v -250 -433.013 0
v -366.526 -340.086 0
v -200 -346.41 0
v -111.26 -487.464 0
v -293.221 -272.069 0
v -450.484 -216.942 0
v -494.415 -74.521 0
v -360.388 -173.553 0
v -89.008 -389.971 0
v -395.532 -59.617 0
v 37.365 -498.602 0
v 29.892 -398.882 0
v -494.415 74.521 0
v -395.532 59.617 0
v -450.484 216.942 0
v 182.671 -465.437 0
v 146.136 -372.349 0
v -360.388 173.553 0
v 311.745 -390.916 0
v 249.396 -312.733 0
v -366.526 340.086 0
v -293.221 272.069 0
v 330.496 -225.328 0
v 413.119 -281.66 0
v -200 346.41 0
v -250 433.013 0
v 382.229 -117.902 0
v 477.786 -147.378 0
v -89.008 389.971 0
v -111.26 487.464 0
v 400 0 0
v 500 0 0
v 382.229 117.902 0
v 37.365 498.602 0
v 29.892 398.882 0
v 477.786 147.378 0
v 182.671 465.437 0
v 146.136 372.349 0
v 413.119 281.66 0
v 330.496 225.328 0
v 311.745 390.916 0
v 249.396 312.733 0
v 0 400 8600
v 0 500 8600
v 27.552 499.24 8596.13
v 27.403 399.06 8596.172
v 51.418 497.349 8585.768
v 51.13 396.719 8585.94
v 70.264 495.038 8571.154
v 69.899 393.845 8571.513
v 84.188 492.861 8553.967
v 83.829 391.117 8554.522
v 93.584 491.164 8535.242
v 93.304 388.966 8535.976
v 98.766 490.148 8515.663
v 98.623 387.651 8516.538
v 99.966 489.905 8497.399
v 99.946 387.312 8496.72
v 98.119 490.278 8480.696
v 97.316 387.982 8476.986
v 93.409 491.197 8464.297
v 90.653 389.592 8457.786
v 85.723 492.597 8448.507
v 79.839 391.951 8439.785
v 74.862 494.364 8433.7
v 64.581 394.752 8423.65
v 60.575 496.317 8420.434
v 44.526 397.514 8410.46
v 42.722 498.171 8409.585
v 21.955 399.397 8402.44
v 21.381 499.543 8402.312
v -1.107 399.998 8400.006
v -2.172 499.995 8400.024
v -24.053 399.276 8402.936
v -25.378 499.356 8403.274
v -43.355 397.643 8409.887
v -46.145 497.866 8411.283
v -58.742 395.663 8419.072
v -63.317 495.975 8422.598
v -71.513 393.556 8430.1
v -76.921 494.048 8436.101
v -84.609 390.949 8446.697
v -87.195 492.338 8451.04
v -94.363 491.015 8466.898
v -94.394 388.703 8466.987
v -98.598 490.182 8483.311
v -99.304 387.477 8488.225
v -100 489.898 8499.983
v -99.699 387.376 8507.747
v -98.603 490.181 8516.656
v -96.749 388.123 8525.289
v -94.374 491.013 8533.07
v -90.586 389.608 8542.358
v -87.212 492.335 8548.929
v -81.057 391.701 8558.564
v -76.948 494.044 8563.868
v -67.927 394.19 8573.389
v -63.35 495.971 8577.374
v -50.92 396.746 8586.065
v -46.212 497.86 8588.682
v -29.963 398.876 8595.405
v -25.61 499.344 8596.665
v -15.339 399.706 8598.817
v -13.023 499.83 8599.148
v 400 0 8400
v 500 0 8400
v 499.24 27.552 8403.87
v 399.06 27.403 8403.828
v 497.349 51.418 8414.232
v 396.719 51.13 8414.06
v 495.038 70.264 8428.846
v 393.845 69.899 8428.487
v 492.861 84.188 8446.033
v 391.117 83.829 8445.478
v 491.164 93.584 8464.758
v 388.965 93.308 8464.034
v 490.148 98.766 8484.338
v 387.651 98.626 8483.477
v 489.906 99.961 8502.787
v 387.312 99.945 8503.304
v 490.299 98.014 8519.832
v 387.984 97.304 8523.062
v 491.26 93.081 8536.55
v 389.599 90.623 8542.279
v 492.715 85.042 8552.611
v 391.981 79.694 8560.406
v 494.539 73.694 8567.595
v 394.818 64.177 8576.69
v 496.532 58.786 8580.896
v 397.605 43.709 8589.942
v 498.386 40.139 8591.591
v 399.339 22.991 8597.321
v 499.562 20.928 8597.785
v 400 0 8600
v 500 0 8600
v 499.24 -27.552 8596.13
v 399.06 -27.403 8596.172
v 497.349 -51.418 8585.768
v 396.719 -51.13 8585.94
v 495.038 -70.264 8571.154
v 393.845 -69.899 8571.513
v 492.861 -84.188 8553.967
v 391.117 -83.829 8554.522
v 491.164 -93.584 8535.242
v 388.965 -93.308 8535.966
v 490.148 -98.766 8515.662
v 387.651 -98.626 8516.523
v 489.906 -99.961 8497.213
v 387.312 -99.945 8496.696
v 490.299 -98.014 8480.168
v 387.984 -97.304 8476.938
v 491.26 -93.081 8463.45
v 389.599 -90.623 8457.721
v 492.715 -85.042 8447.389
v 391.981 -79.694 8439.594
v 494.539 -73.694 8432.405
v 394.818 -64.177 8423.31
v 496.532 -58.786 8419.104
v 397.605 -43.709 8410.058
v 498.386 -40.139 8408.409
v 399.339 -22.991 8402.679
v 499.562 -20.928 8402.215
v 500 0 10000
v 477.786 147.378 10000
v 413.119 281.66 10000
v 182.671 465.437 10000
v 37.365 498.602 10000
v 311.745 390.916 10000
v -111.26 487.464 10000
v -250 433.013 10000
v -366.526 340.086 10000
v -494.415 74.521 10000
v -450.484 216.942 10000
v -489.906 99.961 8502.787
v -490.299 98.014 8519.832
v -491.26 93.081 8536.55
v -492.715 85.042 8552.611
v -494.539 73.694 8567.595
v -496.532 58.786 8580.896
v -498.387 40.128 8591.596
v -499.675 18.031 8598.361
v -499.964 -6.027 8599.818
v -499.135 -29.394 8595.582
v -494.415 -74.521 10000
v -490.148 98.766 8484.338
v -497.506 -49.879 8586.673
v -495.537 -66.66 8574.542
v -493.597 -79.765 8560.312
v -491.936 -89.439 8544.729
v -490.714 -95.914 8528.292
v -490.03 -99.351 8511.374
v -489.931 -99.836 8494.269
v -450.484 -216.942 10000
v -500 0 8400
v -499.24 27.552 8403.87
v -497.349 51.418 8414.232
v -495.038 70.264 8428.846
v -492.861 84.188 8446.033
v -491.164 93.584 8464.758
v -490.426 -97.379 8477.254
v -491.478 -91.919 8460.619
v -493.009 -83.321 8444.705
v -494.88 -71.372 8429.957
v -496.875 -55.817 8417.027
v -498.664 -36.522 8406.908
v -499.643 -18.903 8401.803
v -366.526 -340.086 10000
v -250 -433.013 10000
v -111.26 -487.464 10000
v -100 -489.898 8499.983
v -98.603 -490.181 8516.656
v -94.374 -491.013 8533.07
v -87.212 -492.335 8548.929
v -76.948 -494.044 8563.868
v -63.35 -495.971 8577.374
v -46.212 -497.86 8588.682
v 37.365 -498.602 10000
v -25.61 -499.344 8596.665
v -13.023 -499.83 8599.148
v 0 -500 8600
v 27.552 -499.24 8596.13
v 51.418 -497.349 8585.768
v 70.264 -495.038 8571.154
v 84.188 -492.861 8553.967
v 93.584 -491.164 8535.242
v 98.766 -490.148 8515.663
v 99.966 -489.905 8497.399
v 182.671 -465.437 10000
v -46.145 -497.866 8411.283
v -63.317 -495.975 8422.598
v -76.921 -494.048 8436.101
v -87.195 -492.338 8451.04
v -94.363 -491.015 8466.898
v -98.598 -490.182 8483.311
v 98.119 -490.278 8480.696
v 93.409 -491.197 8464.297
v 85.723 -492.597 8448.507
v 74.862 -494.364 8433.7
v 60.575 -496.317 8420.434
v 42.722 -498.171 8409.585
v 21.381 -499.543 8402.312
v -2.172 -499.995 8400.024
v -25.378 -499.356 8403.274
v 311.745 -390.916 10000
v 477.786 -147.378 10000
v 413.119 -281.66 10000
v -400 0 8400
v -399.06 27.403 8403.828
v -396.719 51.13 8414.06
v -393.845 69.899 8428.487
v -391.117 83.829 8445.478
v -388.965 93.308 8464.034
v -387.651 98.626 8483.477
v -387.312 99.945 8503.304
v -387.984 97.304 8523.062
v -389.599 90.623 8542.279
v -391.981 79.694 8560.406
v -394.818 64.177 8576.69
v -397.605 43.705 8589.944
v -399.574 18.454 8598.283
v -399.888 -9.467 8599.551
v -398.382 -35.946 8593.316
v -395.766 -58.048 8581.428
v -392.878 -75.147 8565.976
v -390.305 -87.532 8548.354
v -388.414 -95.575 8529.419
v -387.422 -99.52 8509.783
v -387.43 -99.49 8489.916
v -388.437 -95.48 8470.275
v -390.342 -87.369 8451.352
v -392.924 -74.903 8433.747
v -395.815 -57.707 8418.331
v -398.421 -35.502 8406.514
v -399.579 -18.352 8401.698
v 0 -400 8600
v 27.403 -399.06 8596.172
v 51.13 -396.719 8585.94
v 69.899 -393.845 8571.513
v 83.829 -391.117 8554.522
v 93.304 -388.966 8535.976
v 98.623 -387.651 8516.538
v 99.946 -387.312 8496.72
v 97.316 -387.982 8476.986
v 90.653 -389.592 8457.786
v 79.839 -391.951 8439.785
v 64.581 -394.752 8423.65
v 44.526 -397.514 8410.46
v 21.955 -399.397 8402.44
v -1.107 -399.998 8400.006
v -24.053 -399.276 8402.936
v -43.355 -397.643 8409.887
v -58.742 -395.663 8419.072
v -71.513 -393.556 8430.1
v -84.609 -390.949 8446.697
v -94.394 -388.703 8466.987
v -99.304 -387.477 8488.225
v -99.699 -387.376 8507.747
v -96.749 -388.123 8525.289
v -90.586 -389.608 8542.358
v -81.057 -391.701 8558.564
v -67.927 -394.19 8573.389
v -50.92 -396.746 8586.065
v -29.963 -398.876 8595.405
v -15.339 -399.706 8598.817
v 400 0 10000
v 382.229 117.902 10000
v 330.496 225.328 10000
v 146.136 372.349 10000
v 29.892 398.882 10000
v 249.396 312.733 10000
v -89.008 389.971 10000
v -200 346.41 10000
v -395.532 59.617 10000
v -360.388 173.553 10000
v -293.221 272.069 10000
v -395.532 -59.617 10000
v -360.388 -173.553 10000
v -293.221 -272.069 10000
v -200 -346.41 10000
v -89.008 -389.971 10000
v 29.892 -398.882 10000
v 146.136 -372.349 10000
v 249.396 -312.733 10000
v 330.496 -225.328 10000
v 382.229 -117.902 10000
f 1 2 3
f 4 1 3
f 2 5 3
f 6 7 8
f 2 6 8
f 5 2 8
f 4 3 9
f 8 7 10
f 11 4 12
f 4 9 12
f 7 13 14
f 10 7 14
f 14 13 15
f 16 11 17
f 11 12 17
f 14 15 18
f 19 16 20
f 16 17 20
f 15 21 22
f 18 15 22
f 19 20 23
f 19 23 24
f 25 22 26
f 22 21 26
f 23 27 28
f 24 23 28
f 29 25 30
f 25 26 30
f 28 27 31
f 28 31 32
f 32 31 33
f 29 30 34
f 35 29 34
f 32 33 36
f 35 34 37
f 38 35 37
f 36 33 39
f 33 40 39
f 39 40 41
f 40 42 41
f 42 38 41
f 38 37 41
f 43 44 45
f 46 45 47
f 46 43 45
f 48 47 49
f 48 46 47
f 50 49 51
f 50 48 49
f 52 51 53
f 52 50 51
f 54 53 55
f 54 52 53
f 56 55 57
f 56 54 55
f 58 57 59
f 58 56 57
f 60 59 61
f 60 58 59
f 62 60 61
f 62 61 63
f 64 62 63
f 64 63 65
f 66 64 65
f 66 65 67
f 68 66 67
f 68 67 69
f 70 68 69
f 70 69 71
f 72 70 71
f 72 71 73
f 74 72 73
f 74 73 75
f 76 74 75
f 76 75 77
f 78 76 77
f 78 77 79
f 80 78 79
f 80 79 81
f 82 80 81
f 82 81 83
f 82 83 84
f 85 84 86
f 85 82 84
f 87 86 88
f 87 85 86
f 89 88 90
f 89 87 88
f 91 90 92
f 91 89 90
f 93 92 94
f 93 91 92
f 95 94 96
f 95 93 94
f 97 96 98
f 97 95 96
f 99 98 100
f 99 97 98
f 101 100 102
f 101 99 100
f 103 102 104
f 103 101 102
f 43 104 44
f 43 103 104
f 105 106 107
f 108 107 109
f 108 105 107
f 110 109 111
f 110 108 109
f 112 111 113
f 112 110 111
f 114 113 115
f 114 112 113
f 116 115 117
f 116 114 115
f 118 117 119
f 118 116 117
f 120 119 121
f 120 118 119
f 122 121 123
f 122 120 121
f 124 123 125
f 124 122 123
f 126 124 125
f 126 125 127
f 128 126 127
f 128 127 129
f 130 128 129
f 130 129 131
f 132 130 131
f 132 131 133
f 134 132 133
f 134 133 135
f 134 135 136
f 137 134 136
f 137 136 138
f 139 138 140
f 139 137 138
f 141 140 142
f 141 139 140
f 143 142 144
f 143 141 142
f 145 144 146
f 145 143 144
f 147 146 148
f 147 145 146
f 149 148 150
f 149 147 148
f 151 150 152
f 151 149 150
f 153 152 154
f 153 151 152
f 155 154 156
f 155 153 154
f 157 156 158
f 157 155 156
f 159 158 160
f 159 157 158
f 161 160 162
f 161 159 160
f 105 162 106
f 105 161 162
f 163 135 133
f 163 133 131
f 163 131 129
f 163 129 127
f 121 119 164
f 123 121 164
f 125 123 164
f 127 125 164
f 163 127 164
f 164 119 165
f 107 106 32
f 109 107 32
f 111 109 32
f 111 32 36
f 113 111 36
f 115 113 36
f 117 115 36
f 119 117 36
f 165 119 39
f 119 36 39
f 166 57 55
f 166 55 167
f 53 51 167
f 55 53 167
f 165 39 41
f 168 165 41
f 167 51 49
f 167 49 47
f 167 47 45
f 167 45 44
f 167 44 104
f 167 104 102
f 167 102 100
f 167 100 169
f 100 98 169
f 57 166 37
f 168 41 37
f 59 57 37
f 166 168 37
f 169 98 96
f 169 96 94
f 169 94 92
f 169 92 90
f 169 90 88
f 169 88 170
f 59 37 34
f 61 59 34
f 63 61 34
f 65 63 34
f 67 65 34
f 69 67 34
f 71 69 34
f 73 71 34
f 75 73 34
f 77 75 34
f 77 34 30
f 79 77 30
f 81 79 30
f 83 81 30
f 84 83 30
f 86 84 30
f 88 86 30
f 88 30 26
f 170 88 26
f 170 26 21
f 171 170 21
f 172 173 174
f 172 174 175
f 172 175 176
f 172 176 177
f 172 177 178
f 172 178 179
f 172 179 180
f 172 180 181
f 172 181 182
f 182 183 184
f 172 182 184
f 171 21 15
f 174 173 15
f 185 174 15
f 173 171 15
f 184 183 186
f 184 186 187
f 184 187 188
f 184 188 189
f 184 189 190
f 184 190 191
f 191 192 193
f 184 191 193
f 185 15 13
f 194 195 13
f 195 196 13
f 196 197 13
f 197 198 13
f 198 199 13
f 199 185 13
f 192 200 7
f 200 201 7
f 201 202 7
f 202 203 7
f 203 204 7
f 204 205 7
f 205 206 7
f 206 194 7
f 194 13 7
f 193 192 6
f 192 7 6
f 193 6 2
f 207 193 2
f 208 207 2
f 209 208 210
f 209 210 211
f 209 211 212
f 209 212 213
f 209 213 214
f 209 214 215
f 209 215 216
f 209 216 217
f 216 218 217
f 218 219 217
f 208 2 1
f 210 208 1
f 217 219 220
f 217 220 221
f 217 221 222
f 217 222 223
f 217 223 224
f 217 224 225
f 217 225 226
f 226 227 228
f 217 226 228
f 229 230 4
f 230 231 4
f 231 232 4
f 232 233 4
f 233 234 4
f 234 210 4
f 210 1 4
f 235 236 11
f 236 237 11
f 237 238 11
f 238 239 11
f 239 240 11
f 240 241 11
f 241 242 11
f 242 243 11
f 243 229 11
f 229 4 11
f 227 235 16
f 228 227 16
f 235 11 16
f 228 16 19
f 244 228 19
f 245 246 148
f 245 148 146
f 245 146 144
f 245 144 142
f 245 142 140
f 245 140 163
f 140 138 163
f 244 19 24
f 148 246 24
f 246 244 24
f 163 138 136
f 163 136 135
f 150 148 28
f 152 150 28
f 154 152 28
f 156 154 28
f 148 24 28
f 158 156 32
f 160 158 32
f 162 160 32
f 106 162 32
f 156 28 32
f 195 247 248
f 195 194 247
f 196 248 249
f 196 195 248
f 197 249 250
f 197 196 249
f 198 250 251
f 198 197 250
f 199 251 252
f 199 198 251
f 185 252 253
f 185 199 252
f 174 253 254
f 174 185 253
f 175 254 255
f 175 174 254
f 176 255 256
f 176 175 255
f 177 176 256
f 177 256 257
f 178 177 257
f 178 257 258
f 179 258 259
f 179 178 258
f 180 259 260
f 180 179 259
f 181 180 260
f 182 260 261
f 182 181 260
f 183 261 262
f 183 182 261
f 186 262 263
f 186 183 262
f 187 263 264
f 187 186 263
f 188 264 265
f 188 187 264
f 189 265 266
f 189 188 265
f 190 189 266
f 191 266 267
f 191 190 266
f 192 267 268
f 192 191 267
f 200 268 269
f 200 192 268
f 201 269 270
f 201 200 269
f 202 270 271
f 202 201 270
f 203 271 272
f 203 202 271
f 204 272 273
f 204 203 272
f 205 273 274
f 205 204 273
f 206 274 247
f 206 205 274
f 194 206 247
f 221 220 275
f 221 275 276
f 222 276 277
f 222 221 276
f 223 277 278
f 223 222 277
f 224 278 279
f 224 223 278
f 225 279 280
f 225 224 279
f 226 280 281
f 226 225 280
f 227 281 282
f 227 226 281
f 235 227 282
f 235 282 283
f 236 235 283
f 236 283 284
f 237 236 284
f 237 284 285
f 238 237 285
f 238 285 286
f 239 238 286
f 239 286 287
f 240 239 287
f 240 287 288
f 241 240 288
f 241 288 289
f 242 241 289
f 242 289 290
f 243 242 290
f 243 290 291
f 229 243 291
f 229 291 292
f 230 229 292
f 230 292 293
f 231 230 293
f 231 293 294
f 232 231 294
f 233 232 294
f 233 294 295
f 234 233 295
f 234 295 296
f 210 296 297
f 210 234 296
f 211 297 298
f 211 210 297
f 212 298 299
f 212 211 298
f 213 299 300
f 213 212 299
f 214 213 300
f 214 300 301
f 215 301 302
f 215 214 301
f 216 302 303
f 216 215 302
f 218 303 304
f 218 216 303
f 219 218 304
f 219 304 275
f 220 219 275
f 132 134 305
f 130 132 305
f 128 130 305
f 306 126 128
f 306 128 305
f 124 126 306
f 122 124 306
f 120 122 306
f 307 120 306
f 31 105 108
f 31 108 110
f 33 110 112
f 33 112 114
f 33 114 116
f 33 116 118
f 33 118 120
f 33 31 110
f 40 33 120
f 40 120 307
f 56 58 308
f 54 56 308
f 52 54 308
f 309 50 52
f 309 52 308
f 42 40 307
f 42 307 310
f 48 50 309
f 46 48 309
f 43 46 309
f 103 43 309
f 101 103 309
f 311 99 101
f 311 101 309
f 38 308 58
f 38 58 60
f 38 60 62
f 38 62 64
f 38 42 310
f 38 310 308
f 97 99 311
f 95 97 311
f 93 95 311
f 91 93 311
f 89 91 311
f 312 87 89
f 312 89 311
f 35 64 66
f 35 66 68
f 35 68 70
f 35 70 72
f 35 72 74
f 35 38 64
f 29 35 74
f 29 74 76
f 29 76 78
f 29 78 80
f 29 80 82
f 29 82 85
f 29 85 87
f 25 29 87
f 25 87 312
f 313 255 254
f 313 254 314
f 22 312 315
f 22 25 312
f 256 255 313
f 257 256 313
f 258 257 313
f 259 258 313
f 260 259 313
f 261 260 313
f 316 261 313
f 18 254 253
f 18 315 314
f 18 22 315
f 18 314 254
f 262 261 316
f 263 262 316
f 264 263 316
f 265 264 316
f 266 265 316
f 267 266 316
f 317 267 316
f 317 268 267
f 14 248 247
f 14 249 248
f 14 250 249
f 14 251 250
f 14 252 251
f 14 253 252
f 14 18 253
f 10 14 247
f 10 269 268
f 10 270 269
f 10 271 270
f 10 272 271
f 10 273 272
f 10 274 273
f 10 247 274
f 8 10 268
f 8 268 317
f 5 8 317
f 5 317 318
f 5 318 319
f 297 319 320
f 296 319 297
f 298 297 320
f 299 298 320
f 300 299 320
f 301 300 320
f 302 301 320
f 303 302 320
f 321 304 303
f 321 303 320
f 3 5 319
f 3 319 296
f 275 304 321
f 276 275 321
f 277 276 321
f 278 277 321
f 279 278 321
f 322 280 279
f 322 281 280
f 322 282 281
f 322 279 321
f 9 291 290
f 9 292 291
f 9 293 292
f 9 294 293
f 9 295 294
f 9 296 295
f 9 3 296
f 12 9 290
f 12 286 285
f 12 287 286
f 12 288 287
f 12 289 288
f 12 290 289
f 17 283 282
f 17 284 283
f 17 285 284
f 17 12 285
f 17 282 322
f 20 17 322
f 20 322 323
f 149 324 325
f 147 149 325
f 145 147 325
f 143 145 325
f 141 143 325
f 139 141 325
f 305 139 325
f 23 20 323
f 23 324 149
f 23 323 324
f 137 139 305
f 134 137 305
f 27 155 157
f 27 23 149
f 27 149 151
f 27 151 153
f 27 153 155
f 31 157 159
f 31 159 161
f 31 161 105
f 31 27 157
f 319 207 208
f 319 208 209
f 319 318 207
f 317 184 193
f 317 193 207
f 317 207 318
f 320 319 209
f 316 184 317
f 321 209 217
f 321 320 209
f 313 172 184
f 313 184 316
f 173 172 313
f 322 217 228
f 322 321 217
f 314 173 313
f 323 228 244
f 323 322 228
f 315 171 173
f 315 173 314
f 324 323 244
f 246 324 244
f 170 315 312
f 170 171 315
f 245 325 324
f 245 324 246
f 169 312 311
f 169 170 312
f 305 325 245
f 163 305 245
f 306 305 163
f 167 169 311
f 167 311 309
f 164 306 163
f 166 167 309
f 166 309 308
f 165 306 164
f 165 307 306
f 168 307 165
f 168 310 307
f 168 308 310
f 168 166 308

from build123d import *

# Parameters (mm, degrees)
SKETCH1_R               = 500
SKETCH1_R_2             = 400
BOSS_EXTRUDE1_DEPTH     = 10000
CUT_EXTRUDE1_DEPTH      = 10025.968827882
CUT_EXTRUDE1_DEPTH_BACK = 10025.968827882
SKETCH2_R               = 100
CUT_EXTRUDE2_DEPTH      = 10025.968827991
CUT_EXTRUDE2_DEPTH_BACK = 10025.968827991
SKETCH3_R               = 100


with BuildPart() as part:
    # Sketch1 → Boss-Extrude1 (new body)
    with BuildSketch(Plane.XY):
        Circle(SKETCH1_R)
        Circle(SKETCH1_R_2, mode=Mode.SUBTRACT)
    extrude(amount=BOSS_EXTRUDE1_DEPTH)

    # Sketch2 → Cut-Extrude1 (cut, two sides: drawn at the far end of the back side and taken through both)
    with BuildSketch(Plane(origin=(0, 0, 0), x_dir=(1, 0, 0), z_dir=(0, 1, 0)).offset(-CUT_EXTRUDE1_DEPTH_BACK)):
        with Locations(Location((0, -8500, 0), (0, 0, 270))):
            Circle(SKETCH2_R)
    extrude(amount=CUT_EXTRUDE1_DEPTH + CUT_EXTRUDE1_DEPTH_BACK, mode=Mode.SUBTRACT)

    # Sketch3 → Cut-Extrude2 (cut, two sides: drawn at the far end of the back side and taken through both)
    with BuildSketch(Plane(origin=(0, 0, 0), x_dir=(0, 0, -1), z_dir=(1, 0, 0)).offset(-CUT_EXTRUDE2_DEPTH_BACK)):
        with Locations((-8500, 0)):
            Circle(SKETCH3_R)
    extrude(amount=CUT_EXTRUDE2_DEPTH + CUT_EXTRUDE2_DEPTH_BACK, mode=Mode.SUBTRACT)


solid = part.part
